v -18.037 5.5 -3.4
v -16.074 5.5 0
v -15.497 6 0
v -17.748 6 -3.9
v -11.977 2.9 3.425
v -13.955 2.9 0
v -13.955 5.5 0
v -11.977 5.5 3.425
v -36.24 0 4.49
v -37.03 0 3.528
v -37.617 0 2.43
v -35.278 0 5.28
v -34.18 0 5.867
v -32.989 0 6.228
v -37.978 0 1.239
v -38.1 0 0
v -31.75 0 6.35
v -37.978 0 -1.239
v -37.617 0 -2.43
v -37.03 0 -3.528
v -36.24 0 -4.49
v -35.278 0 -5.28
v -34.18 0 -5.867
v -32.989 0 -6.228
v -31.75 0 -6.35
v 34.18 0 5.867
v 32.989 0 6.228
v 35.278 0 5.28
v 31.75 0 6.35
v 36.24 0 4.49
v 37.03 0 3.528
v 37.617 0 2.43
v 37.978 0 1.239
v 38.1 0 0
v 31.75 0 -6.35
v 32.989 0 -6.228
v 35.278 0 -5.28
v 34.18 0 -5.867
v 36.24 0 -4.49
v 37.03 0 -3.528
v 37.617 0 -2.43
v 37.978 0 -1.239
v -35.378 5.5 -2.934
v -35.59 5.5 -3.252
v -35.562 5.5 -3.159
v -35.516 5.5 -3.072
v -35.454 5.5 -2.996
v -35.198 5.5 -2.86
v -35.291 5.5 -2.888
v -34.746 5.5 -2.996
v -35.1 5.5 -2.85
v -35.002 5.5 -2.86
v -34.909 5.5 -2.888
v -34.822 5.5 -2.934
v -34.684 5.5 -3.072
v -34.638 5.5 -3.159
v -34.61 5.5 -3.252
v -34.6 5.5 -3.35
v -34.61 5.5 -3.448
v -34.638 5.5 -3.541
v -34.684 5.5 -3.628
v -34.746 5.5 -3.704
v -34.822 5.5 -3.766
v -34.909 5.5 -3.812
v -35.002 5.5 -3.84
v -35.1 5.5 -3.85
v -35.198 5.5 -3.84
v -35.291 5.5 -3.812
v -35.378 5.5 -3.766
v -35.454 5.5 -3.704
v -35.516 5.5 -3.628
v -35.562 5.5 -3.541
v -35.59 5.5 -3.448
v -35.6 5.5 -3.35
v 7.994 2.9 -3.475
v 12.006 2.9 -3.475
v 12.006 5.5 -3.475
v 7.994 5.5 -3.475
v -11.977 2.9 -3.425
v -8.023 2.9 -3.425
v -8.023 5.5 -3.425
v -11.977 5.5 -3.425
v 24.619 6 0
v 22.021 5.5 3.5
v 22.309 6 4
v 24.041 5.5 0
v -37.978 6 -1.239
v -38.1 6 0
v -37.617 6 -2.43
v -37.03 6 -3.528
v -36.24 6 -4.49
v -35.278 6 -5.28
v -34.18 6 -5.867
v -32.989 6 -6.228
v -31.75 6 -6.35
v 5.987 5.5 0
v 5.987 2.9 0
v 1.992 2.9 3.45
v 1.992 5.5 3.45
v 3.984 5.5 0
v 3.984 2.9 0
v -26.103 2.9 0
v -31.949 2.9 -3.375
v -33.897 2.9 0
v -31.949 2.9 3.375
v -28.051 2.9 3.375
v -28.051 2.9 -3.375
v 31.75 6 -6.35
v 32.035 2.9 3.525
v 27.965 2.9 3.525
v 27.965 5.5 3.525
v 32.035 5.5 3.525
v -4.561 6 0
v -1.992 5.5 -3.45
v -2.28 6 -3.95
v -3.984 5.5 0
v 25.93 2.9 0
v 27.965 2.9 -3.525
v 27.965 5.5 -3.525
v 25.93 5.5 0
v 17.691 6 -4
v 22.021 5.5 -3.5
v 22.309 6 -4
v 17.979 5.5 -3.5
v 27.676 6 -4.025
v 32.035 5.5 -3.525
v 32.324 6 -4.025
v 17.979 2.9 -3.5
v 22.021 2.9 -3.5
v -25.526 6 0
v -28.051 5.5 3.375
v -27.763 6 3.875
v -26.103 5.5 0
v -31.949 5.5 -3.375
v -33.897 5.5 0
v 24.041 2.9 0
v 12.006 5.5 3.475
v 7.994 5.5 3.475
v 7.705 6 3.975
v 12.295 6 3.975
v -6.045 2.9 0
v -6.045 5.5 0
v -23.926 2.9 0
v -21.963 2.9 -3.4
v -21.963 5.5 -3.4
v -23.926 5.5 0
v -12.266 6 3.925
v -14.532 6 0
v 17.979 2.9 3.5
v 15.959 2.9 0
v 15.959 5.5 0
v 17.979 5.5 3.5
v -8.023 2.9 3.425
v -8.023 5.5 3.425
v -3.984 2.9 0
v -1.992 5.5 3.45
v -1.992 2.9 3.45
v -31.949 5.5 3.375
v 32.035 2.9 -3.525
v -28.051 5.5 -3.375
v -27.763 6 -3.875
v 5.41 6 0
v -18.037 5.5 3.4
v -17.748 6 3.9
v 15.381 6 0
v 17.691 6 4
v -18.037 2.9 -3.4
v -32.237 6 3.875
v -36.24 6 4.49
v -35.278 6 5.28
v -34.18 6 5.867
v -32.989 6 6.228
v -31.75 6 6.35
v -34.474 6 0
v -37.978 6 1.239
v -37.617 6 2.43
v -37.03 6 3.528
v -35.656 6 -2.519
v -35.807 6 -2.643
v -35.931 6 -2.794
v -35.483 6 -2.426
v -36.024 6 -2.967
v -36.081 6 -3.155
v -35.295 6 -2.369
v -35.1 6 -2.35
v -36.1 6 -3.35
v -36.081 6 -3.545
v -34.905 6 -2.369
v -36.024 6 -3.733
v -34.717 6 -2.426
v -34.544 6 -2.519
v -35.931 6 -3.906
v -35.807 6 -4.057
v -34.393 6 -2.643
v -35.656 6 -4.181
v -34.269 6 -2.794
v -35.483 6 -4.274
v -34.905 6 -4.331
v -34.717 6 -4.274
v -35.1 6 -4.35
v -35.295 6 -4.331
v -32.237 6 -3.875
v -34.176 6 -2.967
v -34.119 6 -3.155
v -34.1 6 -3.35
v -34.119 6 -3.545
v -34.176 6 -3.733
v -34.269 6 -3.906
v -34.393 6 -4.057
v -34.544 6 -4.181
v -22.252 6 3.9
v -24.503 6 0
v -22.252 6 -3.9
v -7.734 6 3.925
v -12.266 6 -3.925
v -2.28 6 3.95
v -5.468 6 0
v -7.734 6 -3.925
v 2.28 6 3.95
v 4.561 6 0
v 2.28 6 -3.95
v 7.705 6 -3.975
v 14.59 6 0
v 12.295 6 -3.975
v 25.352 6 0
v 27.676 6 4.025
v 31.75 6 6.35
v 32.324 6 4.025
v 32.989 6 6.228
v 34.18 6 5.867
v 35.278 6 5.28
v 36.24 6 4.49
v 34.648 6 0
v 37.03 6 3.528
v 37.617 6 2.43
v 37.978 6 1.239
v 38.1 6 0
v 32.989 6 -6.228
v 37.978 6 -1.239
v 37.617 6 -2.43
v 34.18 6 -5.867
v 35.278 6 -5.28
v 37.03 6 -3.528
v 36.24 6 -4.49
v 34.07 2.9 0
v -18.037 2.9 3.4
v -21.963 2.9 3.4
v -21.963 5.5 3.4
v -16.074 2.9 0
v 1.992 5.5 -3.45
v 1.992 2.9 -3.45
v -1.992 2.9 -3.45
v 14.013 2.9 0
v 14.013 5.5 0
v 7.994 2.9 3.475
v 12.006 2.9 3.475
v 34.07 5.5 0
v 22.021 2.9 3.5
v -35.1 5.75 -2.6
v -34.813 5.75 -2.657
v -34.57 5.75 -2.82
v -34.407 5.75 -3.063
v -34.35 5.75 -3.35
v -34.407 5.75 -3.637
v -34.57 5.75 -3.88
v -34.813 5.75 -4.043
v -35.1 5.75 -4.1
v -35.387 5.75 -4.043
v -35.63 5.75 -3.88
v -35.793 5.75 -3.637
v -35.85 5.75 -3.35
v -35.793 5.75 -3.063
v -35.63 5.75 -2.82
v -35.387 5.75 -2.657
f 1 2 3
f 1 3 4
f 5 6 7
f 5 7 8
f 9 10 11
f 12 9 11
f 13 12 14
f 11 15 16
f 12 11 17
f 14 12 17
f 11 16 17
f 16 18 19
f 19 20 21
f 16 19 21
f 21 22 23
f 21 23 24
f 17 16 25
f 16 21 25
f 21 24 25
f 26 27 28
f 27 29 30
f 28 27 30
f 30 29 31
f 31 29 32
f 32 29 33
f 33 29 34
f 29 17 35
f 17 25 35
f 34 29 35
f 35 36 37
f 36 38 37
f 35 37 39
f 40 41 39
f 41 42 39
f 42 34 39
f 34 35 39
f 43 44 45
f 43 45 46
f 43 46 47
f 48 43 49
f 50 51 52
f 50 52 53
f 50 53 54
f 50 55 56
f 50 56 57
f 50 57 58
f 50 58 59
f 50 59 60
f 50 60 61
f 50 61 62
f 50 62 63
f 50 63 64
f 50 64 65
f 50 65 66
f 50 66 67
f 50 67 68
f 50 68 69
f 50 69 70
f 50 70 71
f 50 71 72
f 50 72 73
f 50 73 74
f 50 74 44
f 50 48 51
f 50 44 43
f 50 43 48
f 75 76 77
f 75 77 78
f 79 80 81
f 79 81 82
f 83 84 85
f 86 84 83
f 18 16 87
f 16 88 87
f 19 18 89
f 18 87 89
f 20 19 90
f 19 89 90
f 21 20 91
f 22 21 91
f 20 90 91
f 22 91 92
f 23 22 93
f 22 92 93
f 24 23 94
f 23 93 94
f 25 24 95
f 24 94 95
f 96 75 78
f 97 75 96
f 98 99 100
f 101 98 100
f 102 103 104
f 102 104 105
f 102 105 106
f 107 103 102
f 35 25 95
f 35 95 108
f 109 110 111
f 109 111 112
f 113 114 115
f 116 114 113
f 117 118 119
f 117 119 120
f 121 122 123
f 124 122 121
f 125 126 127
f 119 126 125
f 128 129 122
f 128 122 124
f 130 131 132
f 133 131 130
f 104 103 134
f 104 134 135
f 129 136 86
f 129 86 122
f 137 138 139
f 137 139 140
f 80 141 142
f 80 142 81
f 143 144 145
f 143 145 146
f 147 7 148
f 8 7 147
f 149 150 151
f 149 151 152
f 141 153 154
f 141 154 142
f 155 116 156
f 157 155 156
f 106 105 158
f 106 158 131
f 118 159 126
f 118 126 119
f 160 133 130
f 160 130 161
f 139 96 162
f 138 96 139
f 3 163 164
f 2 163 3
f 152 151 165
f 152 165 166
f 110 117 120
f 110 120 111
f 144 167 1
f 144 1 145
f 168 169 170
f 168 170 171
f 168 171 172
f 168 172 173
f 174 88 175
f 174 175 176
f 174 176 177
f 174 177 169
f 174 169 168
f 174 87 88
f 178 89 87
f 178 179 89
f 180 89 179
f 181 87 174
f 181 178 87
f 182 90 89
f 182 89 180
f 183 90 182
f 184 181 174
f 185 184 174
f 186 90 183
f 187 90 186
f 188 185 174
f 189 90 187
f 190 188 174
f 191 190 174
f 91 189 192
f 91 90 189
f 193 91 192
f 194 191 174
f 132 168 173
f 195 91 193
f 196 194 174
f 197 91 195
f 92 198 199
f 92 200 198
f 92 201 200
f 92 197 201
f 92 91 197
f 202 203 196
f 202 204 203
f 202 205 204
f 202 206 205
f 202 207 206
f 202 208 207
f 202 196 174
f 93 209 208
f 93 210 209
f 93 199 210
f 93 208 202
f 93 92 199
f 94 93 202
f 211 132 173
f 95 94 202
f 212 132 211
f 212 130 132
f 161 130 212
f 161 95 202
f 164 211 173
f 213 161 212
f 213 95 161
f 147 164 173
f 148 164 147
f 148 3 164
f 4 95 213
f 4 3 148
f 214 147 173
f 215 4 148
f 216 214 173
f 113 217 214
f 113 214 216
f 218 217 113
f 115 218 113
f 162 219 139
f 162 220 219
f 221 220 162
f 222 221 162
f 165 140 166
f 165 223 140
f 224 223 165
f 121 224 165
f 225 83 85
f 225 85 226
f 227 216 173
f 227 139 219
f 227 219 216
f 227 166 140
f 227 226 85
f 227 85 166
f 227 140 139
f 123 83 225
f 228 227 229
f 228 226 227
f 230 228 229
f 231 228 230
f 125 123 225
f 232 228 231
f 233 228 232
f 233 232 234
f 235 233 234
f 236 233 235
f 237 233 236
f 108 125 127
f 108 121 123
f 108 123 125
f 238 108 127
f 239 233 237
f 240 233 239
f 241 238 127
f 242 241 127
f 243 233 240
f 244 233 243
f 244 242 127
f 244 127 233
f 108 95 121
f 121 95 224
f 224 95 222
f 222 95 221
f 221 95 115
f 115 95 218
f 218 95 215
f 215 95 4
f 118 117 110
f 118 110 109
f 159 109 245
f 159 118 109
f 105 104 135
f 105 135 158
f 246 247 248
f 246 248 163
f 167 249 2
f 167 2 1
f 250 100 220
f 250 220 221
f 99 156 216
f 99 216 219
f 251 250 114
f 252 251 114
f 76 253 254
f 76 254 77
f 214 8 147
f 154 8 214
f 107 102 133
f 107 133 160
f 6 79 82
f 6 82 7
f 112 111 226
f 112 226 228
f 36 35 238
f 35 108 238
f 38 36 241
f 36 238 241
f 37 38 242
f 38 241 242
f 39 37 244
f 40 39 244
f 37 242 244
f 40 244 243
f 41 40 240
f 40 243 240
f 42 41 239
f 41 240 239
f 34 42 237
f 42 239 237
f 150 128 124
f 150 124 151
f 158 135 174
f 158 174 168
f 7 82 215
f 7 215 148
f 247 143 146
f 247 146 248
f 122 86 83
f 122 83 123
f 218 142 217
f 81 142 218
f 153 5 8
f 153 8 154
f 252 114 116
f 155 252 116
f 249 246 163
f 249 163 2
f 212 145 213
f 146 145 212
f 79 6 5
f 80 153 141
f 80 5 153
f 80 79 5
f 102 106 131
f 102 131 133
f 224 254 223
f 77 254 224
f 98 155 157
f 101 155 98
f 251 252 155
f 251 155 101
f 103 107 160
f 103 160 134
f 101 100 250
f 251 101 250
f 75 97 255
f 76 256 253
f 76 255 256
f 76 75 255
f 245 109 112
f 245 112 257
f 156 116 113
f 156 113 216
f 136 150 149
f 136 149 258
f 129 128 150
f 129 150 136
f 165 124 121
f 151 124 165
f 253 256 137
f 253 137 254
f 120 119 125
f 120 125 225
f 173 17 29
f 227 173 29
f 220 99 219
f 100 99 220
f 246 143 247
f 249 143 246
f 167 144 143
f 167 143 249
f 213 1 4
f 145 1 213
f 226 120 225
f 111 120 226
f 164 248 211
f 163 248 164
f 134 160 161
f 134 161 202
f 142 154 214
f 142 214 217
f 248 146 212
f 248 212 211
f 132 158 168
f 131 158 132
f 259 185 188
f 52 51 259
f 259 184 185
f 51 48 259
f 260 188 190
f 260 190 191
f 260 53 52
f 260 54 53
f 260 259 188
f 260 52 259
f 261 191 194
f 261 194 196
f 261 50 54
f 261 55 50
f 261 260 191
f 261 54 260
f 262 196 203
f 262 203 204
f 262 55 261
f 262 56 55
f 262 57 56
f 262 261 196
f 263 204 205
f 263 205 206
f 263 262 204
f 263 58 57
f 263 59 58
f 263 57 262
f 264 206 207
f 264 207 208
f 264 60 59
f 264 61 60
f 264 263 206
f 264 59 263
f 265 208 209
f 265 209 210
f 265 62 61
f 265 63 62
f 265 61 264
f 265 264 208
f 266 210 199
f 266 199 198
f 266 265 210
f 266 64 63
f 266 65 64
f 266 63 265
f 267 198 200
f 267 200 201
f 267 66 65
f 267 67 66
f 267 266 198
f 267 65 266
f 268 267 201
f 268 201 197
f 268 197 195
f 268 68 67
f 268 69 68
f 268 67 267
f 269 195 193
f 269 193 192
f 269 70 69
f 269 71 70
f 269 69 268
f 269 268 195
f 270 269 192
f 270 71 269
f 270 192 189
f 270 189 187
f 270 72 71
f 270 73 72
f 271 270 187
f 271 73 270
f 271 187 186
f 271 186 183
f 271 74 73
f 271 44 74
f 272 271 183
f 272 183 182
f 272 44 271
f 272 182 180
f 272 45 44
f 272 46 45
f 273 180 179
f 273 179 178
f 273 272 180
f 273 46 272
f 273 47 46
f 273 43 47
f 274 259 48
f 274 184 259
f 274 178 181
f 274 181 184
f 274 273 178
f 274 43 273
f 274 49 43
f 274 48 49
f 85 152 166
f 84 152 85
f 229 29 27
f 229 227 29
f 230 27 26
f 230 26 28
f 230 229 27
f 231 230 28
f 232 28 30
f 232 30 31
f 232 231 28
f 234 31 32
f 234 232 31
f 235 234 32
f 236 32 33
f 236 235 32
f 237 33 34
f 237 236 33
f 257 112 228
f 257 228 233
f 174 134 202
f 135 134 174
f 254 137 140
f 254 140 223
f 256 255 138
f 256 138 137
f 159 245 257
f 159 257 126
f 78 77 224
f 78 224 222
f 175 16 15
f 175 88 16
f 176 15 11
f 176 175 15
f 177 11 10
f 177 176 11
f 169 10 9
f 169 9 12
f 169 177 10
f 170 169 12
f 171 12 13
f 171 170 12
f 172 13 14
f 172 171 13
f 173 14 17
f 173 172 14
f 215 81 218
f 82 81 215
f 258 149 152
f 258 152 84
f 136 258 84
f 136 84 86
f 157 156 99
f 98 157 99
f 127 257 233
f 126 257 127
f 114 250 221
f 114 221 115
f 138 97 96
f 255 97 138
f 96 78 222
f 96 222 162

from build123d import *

# Parameters (mm, degrees)
SKETCH1_W           = 76.2
SKETCH1_H           = 12.7
BOSS_EXTRUDE1_DEPTH = 6
CUT_EXTRUDE1_DEPTH  = 3.1
LPATTERN1_START     = 2.9
LPATTERN1_DEPTH     = 3.1
SKETCH3_R           = 0.5
CUT_EXTRUDE2_DEPTH  = 0.5
FILLET1_R           = 6.35
CHAMFER1_SIZE       = 0.5


# Read off the part's stored shape, not the designer's step: LPattern1
with BuildPart() as part:
    # Sketch1 → Boss-Extrude1 (new body)
    with BuildSketch(Plane(origin=(0, 0, 0), x_dir=(1, 0, 0), z_dir=(0, 1, 0))):
        Rectangle(SKETCH1_W, SKETCH1_H)
    extrude(amount=BOSS_EXTRUDE1_DEPTH)

    # Sketch2 → Cut-Extrude1 (cut)
    with BuildSketch(Plane(origin=(0, 6, 0), x_dir=(1, 0, 0), z_dir=(0, 1, 0))):
        Polygon((1.991858429, 3.45), (-1.991858429, 3.45), (-3.983716857, 0), (-1.991858429, -3.45), (1.991858429, -3.45), (3.983716857, 0), align=None)
    extrude(amount=-CUT_EXTRUDE1_DEPTH, mode=Mode.SUBTRACT)

    # LPattern1 outline → LPattern1 (cut)
    with BuildSketch(Plane(origin=(0, 0, 0), x_dir=(1, 0, 0), z_dir=(0, 1, 0)).offset(LPATTERN1_START)):
        Polygon((-8.022575328, -3.425), (-6.045150656, 0), (-8.022575328, 3.425), (-11.977424672, 3.425), (-13.954849344, 0), (-11.977424672, -3.425), align=None)
        Polygon((-18.037009085, -3.4), (-16.07401817, 0), (-18.037009085, 3.4), (-21.962990915, 3.4), (-23.92598183, 0), (-21.962990915, -3.4), align=None)
        Polygon((-28.051442841, -3.375), (-26.102885683, 0), (-28.051442841, 3.375), (-31.948557159, 3.375), (-33.897114317, 0), (-31.948557159, -3.375), align=None)
        Polygon((12.006292185, -3.475), (14.012584371, 0), (12.006292185, 3.475), (7.993707815, 3.475), (5.987415629, 0), (7.993707815, -3.475), align=None)
        Polygon((22.020725942, -3.5), (24.041451884, 0), (22.020725942, 3.5), (17.979274058, 3.5), (15.958548116, 0), (17.979274058, -3.5), align=None)
        Polygon((32.035159699, -3.525), (34.070319398, 0), (32.035159699, 3.525), (27.964840301, 3.525), (25.929680602, 0), (27.964840301, -3.525), align=None)
    extrude(amount=LPATTERN1_DEPTH, mode=Mode.SUBTRACT)

    # Sketch3 → Cut-Extrude2 (cut)
    with BuildSketch(Plane(origin=(0, 6, 0), x_dir=(1, 0, 0), z_dir=(0, 1, 0))):
        with Locations(Location((-35.1, 3.35, 0), (0, 0, 270))):
            Circle(SKETCH3_R)
    extrude(amount=-CUT_EXTRUDE2_DEPTH, mode=Mode.SUBTRACT)

    # Fillet1
    fillet1_edges = [part.edges().sort_by_distance(p)[0] for p in [
        (38.1, 3, -6.35),
        (38.1, 3, 6.35),
        (-38.1, 3, -6.35),
        (-38.1, 3, 6.35),
    ]]
    fillet(fillet1_edges, radius=FILLET1_R - 0.0001)  # a hair under: the kernel refuses the full size

    # Chamfer1
    chamfer1_edges = [part.edges().sort_by_distance(p)[0] for p in [
        (-35.1, 6, -3.85),
        (2.987787643, 6, -1.725),
        (0, 6, -3.45),
        (-2.987787643, 6, -1.725),
        (-2.987787643, 6, 1.725),
        (0, 6, 3.45),
        (2.987787643, 6, 1.725),
        (33.052739548, 6, -1.7625),
        (30, 6, -3.525),
        (26.947260452, 6, -1.7625),
        (26.947260452, 6, 1.7625),
        (30, 6, 3.525),
        (33.052739548, 6, 1.7625),
        (23.031088913, 6, -1.75),
        (20, 6, -3.5),
        (16.968911087, 6, -1.75),
        (16.968911087, 6, 1.75),
        (20, 6, 3.5),
        (23.031088913, 6, 1.75),
        (13.009438278, 6, -1.7375),
        (10, 6, -3.475),
        (6.990561722, 6, -1.7375),
        (6.990561722, 6, 1.7375),
        (10, 6, 3.475),
        (13.009438278, 6, 1.7375),
        (-27.077164262, 6, -1.6875),
        (-30, 6, -3.375),
        (-32.922835738, 6, -1.6875),
        (-32.922835738, 6, 1.6875),
        (-30, 6, 3.375),
        (-27.077164262, 6, 1.6875),
        (-17.055513628, 6, -1.7),
        (-20, 6, -3.4),
        (-22.944486373, 6, -1.7),
        (-22.944486372, 6, 1.7),
        (-20, 6, 3.4),
        (-17.055513627, 6, 1.7),
        (-7.033862992, 6, -1.7125),
        (-10, 6, -3.425),
        (-12.966137008, 6, -1.7125),
        (-12.966137008, 6, 1.7125),
        (-10, 6, 3.425),
        (-7.033862992, 6, 1.7125),
    ]]
    chamfer(chamfer1_edges, length=CHAMFER1_SIZE - 0.0001)  # a hair under: the kernel refuses the full size


solid = part.part
